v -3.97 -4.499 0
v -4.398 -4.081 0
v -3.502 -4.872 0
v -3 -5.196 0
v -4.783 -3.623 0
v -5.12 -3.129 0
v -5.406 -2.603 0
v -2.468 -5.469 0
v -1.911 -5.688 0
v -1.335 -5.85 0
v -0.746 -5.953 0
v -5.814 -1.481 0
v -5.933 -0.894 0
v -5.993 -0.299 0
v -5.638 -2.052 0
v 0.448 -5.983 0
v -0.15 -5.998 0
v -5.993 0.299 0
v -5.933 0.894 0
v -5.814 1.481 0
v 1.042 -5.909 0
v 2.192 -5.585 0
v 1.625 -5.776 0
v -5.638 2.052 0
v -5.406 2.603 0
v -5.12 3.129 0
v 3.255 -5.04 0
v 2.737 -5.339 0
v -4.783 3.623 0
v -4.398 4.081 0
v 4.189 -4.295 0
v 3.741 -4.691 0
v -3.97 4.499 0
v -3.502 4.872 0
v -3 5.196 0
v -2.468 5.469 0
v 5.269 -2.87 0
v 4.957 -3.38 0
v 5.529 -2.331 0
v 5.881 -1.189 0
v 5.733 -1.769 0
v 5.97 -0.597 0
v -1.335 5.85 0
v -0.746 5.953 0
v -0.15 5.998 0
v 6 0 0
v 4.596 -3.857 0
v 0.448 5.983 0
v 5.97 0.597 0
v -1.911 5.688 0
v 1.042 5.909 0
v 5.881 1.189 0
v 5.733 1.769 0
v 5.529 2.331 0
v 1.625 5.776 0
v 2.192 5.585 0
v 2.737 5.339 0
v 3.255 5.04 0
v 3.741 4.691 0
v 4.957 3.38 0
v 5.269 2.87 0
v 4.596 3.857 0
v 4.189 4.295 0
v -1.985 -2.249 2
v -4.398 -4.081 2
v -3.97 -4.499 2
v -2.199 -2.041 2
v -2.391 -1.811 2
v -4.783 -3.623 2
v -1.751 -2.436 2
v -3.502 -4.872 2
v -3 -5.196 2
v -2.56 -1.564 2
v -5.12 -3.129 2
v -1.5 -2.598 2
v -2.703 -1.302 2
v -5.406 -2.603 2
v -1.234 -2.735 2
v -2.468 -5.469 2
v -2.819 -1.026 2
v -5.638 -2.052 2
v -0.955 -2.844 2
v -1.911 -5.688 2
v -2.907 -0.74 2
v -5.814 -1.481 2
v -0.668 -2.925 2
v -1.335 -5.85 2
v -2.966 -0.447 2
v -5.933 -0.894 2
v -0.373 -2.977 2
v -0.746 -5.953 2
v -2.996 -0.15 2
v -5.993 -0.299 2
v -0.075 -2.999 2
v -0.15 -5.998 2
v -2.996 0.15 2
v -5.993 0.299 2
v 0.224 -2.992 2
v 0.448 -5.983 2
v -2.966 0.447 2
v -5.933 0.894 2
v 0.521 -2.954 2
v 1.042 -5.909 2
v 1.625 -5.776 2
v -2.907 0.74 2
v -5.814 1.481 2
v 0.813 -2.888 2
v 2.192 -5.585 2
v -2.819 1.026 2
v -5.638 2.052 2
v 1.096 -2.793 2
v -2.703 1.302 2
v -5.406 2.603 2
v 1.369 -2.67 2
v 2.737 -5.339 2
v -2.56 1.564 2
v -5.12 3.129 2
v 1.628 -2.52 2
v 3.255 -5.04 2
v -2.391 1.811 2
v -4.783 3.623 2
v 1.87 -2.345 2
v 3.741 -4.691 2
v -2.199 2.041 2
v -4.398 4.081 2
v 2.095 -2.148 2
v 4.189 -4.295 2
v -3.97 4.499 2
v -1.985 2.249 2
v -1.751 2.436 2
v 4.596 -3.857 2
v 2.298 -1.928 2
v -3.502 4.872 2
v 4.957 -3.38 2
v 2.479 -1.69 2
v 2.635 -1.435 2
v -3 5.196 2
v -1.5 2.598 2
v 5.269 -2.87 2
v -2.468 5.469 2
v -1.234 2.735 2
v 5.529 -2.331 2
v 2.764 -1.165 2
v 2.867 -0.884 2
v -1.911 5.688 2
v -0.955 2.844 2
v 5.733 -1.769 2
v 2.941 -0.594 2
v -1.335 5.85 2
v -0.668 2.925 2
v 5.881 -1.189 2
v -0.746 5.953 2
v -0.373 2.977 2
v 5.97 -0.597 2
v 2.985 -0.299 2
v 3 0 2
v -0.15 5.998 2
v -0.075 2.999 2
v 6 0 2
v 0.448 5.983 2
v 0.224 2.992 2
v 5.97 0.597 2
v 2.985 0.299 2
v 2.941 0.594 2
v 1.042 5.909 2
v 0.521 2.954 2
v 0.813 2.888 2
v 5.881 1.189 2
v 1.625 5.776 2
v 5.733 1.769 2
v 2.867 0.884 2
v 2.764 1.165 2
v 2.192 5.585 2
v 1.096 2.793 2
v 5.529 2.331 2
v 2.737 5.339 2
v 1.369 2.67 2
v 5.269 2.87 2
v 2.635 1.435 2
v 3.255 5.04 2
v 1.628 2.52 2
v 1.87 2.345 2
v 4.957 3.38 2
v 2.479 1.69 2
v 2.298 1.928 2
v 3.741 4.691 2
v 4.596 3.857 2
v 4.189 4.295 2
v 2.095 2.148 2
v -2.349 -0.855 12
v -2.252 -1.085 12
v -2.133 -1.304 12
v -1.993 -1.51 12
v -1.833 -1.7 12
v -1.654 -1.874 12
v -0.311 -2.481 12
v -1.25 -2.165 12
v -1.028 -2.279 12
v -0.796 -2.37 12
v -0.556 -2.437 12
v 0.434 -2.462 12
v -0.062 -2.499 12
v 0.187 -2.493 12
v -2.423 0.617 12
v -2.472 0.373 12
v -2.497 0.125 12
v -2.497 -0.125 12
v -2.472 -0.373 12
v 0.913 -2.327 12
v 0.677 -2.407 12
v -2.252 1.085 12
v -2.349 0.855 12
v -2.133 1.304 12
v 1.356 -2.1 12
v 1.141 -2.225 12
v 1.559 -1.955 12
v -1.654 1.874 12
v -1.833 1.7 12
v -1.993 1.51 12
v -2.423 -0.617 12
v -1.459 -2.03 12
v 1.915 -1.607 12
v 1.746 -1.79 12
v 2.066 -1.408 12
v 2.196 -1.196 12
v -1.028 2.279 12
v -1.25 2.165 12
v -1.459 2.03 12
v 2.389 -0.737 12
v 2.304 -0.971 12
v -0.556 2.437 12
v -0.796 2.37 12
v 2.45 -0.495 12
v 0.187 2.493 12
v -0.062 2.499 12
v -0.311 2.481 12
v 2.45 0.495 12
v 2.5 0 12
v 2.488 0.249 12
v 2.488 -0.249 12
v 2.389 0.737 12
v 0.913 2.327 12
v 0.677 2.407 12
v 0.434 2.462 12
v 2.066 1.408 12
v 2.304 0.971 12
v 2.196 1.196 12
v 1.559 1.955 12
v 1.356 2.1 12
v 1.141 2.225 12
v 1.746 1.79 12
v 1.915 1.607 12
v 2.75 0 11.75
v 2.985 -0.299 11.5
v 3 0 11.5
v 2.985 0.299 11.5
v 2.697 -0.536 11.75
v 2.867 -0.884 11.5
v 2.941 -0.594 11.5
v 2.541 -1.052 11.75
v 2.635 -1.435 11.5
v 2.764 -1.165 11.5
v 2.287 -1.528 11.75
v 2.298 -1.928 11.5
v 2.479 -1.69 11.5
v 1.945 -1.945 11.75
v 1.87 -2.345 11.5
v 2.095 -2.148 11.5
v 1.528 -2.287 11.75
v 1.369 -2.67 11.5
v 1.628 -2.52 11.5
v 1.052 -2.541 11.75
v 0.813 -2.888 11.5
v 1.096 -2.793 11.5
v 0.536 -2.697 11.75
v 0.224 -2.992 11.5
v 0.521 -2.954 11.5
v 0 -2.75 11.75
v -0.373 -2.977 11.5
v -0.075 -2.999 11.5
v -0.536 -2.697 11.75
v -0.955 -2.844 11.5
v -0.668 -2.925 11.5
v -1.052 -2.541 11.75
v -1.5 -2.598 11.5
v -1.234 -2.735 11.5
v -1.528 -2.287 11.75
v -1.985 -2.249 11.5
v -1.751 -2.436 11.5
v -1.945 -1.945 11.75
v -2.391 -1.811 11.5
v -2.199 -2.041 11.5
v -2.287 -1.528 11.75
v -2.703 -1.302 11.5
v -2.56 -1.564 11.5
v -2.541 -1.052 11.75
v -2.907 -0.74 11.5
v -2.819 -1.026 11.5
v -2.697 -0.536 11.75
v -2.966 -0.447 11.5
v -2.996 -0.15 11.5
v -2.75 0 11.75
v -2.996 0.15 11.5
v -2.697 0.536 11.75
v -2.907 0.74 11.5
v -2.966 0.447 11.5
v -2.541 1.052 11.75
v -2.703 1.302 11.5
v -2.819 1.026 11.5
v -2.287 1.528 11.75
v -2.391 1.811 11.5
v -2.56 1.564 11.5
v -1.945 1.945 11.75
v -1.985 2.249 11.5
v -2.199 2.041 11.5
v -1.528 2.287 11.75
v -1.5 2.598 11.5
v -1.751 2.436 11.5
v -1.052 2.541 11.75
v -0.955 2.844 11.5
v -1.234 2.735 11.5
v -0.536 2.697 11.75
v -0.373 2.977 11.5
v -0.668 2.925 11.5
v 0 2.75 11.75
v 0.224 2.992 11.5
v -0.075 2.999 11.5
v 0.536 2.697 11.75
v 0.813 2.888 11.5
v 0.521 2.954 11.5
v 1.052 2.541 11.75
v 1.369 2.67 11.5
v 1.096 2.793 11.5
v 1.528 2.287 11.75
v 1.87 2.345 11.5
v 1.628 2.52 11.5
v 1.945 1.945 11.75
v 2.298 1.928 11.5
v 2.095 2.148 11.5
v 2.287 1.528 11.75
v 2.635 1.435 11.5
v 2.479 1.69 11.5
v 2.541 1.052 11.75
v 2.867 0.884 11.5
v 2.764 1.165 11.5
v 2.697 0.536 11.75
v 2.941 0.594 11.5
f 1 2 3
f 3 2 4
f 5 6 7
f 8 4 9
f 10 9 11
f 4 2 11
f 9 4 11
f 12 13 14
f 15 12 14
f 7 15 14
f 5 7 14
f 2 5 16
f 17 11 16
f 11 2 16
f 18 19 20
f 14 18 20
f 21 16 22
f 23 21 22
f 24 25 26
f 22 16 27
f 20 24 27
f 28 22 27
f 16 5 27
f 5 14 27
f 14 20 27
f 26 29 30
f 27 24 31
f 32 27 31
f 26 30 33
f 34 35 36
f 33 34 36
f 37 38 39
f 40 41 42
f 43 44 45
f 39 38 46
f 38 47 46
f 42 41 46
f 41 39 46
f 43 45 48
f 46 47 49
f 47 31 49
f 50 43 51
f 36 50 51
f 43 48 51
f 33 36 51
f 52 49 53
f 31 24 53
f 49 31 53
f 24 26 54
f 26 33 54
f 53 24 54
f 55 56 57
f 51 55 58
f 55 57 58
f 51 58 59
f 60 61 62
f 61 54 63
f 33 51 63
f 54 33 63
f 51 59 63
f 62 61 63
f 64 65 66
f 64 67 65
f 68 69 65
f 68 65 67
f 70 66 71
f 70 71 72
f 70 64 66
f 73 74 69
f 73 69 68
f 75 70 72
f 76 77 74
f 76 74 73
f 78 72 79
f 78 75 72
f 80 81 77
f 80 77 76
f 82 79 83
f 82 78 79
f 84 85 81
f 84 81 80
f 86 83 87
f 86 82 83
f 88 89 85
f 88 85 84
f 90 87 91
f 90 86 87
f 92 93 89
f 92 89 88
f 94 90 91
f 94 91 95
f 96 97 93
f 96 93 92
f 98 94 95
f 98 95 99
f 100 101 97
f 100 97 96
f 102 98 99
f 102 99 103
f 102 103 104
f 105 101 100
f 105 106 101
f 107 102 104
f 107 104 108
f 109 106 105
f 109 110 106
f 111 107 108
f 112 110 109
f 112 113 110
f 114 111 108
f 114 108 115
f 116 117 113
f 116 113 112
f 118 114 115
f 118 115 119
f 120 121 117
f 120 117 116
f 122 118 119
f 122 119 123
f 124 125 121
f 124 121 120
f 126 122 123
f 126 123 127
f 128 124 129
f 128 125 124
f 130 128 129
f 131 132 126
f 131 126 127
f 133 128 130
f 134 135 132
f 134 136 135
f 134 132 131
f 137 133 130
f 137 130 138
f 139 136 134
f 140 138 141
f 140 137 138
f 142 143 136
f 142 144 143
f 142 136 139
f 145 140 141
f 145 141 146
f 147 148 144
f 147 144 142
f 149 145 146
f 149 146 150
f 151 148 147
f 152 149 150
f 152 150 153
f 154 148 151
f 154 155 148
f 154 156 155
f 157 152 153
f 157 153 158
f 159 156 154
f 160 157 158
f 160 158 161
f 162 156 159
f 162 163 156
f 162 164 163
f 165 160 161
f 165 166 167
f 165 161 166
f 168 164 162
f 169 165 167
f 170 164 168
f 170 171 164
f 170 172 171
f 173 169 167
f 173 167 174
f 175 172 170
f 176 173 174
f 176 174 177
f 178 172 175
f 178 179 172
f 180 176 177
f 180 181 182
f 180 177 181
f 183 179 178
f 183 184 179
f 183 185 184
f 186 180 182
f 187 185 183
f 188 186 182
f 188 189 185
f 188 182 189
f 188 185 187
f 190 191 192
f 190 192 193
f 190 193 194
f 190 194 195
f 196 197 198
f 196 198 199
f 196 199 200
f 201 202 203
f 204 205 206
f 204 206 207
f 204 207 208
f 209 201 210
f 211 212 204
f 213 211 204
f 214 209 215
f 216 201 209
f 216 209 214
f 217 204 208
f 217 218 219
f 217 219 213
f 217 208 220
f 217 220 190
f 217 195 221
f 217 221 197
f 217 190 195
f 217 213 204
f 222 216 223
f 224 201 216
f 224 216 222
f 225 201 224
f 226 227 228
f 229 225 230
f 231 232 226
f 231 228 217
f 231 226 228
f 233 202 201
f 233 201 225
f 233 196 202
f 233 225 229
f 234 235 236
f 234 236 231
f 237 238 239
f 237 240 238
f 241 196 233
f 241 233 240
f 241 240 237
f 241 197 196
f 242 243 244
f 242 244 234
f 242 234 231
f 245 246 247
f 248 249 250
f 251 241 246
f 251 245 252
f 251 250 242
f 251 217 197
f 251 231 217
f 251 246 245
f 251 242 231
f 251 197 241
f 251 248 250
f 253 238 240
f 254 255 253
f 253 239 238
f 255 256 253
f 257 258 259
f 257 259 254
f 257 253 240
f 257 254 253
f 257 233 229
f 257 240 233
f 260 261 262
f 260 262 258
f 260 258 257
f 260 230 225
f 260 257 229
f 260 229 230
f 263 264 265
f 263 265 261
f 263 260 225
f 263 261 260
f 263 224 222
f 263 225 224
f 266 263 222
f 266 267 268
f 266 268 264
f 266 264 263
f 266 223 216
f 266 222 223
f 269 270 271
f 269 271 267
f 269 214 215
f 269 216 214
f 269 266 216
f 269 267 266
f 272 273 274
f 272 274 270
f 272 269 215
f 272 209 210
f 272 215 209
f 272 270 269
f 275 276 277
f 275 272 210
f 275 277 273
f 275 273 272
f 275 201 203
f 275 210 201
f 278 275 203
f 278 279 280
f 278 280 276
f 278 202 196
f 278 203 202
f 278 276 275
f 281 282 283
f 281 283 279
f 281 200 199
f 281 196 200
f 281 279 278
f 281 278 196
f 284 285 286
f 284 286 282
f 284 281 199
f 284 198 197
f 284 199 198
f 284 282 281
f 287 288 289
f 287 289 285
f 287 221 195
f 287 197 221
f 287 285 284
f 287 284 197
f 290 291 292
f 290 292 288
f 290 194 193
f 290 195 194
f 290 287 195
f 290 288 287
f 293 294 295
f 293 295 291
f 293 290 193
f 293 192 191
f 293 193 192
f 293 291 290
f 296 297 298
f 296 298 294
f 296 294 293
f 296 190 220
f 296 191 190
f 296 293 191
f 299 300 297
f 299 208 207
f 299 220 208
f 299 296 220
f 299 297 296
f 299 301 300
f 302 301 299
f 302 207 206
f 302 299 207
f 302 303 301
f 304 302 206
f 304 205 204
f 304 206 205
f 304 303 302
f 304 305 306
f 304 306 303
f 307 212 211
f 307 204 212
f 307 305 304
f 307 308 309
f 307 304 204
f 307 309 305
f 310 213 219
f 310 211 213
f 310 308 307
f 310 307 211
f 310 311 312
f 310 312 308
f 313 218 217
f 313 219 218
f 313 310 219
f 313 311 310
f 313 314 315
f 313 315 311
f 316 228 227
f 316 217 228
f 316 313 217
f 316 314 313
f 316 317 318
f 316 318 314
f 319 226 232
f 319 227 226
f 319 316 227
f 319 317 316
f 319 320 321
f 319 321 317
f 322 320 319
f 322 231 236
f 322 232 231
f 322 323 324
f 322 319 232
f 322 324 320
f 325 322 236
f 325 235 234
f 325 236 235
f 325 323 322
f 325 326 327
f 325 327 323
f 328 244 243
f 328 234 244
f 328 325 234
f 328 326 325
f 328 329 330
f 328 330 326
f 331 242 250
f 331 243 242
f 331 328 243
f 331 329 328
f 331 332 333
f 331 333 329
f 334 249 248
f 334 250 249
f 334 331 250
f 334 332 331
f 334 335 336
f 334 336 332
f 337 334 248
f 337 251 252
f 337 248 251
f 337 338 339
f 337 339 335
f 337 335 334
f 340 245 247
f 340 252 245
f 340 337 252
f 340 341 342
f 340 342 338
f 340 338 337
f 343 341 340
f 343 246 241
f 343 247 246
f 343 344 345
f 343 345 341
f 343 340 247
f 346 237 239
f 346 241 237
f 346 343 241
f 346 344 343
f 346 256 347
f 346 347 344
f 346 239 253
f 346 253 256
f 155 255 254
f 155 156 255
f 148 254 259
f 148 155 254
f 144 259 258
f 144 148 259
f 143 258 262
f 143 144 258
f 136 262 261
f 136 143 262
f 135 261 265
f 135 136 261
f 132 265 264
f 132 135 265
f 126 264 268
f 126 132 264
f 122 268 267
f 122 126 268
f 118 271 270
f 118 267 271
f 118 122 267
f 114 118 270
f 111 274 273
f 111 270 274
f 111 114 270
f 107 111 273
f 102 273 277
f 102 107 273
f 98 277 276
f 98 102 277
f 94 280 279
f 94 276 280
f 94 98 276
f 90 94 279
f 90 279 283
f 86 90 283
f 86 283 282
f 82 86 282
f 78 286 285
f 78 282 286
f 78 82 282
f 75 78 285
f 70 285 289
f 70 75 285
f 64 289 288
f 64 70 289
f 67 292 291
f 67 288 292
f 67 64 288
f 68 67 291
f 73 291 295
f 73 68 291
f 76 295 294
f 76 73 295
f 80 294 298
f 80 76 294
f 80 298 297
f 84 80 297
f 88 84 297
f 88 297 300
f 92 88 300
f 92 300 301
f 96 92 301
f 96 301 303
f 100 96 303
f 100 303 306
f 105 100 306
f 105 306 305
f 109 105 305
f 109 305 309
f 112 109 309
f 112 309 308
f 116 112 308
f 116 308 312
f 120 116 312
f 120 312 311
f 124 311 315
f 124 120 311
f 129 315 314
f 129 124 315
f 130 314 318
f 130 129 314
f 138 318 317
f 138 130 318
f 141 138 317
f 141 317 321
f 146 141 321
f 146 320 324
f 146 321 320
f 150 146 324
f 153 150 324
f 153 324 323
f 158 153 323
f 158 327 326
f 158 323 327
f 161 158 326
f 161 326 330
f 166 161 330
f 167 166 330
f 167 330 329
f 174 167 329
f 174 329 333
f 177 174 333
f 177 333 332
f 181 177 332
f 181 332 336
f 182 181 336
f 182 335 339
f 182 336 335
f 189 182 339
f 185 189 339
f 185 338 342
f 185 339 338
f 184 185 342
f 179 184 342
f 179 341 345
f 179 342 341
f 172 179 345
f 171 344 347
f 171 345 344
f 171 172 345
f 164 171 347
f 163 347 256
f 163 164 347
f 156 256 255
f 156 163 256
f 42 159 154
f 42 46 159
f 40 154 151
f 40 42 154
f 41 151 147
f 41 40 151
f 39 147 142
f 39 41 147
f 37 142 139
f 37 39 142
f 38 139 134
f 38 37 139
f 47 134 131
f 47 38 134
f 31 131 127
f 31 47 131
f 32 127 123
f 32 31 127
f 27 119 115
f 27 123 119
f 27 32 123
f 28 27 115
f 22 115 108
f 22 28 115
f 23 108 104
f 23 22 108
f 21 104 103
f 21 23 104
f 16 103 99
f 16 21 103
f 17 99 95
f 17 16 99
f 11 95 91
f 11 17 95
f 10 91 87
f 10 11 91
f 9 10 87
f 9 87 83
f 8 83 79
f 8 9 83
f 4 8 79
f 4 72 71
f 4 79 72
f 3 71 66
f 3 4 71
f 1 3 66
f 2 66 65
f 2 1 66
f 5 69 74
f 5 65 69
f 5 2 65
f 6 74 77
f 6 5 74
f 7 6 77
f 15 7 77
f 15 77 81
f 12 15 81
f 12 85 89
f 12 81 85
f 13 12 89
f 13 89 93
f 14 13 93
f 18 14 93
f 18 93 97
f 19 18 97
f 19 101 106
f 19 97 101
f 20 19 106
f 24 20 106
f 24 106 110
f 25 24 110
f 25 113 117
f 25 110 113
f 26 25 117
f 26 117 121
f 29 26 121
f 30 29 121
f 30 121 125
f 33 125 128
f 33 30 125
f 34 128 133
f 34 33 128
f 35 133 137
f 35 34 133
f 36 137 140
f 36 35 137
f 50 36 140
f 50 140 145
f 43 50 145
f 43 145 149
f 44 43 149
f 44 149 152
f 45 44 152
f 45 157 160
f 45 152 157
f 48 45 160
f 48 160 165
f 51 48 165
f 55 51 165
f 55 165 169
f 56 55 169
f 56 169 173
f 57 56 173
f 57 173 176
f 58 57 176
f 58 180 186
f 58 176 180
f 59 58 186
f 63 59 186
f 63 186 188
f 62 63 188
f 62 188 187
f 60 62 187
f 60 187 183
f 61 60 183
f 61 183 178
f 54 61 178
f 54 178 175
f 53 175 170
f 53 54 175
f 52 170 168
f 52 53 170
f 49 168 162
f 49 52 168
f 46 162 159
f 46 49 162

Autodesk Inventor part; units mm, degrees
ref_plane "YZ Plane" through (0, 0, 0) normal (1, 0, 0) x (0, 1, 0)
ref_plane "XZ Plane" through (0, 0, 0) normal (0, 1, 0) x (-1, 0, 0)
ref_plane "XY Plane" through (0, 0, 0) normal (0, 0, 1) x (1, 0, 0)
sketch "Sketch1" plane through (0, 0, 0) normal (0, 0, 1) x (1, 0, 0)
  circle A0 centre (0, 0) radius 6
  dimension "d0" = 12
extrude "Extrusion1" add sketch "Sketch1" along normal blind 2
sketch "Sketch2" plane through (0, 0, 2) normal (0, 0, 1) x (1, 0, 0)
  circle A0 centre (0, 0) radius 3
  dimension "d3" = 6
extrude "Extrusion2" add sketch "Sketch2" along normal blind 10
chamfer "Chamfer1" distance 0.5 angle 45 1 edges at (-3, 0, 12)
properties part number "pin"
